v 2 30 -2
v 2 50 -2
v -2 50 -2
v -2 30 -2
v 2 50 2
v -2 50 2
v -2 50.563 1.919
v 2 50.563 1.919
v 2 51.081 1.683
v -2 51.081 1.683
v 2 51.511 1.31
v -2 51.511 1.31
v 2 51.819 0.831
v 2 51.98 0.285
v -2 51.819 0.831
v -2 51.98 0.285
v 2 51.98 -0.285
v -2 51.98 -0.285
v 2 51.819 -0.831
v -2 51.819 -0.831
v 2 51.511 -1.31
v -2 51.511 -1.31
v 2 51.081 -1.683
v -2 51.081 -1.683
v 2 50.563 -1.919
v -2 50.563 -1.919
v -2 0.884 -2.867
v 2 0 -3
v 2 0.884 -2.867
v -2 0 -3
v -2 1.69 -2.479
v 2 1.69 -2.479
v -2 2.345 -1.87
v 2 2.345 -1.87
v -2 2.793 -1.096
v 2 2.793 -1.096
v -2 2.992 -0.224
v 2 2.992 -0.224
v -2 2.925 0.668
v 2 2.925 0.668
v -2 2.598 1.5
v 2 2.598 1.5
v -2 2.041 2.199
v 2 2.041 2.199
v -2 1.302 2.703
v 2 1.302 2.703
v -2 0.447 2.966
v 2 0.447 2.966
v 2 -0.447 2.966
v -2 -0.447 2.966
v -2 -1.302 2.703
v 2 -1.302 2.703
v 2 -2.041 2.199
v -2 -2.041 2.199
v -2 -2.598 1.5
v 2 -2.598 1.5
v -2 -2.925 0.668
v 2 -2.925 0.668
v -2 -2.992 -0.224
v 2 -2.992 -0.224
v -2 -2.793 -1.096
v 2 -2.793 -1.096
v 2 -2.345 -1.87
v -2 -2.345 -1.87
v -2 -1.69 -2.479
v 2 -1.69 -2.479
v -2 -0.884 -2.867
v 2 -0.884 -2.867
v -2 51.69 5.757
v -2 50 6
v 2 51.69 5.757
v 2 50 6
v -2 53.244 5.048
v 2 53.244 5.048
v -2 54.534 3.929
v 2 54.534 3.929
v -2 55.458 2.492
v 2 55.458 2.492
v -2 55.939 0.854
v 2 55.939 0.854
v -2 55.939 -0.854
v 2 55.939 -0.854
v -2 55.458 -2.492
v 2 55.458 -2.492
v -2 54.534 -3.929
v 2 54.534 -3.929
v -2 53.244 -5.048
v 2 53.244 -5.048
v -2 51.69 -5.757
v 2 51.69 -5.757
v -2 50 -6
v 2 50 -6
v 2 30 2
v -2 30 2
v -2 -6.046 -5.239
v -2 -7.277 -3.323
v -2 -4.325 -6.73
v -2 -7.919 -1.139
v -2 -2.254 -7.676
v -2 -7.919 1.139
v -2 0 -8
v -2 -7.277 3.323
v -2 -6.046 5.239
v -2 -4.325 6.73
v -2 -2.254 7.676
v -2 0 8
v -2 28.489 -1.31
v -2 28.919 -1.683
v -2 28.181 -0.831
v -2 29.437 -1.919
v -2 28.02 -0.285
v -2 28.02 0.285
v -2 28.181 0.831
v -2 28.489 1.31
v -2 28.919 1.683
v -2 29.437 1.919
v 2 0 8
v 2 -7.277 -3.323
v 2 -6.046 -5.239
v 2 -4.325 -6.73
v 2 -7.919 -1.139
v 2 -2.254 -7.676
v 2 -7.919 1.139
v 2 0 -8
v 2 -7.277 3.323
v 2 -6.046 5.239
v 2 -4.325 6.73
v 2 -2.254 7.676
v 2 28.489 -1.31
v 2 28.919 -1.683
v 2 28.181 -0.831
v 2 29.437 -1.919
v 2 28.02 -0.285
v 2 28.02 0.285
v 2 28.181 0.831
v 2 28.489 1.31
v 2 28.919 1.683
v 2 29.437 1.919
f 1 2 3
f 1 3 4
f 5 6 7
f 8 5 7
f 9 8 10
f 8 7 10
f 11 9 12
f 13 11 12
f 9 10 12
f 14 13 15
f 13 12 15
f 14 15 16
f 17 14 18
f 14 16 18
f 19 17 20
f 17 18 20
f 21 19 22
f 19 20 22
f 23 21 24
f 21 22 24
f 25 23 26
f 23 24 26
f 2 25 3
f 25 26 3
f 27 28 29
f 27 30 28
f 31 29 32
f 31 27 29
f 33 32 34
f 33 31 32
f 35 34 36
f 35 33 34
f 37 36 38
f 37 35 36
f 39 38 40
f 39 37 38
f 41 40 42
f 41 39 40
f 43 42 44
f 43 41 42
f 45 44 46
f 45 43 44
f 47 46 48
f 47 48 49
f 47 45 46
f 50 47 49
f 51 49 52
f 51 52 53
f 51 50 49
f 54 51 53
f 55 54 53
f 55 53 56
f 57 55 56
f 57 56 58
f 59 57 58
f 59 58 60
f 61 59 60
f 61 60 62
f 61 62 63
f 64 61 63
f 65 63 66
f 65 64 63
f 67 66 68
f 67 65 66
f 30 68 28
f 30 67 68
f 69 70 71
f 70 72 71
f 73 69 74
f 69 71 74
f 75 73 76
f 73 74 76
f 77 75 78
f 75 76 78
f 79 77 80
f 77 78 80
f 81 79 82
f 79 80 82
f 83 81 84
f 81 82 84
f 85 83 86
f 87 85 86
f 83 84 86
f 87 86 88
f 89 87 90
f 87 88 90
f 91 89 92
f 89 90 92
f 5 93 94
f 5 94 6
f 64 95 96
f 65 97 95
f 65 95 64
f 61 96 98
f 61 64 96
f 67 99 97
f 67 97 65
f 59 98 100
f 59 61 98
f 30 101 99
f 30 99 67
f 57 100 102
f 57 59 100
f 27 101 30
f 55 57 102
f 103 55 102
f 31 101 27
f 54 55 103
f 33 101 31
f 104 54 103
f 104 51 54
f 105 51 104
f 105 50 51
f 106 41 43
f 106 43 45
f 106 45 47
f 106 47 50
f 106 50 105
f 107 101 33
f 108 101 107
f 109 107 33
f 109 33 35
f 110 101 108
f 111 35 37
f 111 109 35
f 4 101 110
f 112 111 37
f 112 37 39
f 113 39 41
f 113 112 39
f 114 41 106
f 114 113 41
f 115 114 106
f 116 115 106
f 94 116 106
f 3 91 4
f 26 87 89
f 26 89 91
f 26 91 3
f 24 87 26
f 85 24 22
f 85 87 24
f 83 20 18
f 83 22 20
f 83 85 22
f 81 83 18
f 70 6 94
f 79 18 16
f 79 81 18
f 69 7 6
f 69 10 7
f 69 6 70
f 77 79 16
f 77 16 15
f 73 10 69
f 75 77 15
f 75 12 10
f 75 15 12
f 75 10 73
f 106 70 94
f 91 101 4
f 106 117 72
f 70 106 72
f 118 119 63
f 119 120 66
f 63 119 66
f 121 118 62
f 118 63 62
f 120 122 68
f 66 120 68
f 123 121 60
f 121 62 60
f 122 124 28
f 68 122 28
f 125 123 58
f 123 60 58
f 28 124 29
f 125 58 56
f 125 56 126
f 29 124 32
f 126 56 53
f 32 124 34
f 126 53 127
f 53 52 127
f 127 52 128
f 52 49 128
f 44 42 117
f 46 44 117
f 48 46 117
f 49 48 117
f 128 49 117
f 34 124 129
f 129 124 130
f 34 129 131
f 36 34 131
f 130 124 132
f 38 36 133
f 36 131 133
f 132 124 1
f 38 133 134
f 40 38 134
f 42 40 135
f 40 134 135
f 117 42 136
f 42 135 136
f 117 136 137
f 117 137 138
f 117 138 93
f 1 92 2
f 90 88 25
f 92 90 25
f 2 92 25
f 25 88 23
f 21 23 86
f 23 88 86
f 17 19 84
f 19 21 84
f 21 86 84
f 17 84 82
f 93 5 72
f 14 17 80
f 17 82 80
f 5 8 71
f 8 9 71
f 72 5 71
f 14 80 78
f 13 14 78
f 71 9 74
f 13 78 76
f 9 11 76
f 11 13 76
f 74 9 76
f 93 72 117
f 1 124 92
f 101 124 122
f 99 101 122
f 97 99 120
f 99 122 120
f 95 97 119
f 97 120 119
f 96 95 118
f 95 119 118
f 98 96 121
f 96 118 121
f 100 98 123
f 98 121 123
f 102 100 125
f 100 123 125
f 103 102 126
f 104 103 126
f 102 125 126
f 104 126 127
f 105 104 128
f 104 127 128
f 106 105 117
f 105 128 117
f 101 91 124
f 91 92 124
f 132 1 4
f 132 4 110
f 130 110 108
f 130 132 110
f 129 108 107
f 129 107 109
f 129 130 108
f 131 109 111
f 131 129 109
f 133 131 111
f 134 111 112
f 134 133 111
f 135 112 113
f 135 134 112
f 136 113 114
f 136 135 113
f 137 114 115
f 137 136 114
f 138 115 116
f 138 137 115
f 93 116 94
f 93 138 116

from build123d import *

# Parameters (mm, degrees)
SKETCH1_R           = 3
BOSS_EXTRUDE1_DEPTH = 2


with BuildPart() as part:
    # Sketch1 → Boss-Extrude1 (new, symmetric)
    with BuildSketch(Plane(origin=(0, 0, 0), x_dir=(0, 0, -1), z_dir=(1, 0, 0))):
        with BuildLine():
            Line((-8, 0), (-6, 50))
            ThreePointArc((-6, 50), (0, 56), (6, 50))
            Line((6, 50), (8, 0))
            ThreePointArc((8, 0), (0, -8), (-8, 0))
        make_face()
        Circle(SKETCH1_R, mode=Mode.SUBTRACT)
        with BuildLine():
            Line((2, 50), (2, 30))
            ThreePointArc((2, 30), (0, 28), (-2, 30))
            Line((-2, 30), (-2, 50))
            ThreePointArc((-2, 50), (0, 52), (2, 50))
        make_face(mode=Mode.SUBTRACT)
    extrude(amount=BOSS_EXTRUDE1_DEPTH, both=True)


solid = part.part
